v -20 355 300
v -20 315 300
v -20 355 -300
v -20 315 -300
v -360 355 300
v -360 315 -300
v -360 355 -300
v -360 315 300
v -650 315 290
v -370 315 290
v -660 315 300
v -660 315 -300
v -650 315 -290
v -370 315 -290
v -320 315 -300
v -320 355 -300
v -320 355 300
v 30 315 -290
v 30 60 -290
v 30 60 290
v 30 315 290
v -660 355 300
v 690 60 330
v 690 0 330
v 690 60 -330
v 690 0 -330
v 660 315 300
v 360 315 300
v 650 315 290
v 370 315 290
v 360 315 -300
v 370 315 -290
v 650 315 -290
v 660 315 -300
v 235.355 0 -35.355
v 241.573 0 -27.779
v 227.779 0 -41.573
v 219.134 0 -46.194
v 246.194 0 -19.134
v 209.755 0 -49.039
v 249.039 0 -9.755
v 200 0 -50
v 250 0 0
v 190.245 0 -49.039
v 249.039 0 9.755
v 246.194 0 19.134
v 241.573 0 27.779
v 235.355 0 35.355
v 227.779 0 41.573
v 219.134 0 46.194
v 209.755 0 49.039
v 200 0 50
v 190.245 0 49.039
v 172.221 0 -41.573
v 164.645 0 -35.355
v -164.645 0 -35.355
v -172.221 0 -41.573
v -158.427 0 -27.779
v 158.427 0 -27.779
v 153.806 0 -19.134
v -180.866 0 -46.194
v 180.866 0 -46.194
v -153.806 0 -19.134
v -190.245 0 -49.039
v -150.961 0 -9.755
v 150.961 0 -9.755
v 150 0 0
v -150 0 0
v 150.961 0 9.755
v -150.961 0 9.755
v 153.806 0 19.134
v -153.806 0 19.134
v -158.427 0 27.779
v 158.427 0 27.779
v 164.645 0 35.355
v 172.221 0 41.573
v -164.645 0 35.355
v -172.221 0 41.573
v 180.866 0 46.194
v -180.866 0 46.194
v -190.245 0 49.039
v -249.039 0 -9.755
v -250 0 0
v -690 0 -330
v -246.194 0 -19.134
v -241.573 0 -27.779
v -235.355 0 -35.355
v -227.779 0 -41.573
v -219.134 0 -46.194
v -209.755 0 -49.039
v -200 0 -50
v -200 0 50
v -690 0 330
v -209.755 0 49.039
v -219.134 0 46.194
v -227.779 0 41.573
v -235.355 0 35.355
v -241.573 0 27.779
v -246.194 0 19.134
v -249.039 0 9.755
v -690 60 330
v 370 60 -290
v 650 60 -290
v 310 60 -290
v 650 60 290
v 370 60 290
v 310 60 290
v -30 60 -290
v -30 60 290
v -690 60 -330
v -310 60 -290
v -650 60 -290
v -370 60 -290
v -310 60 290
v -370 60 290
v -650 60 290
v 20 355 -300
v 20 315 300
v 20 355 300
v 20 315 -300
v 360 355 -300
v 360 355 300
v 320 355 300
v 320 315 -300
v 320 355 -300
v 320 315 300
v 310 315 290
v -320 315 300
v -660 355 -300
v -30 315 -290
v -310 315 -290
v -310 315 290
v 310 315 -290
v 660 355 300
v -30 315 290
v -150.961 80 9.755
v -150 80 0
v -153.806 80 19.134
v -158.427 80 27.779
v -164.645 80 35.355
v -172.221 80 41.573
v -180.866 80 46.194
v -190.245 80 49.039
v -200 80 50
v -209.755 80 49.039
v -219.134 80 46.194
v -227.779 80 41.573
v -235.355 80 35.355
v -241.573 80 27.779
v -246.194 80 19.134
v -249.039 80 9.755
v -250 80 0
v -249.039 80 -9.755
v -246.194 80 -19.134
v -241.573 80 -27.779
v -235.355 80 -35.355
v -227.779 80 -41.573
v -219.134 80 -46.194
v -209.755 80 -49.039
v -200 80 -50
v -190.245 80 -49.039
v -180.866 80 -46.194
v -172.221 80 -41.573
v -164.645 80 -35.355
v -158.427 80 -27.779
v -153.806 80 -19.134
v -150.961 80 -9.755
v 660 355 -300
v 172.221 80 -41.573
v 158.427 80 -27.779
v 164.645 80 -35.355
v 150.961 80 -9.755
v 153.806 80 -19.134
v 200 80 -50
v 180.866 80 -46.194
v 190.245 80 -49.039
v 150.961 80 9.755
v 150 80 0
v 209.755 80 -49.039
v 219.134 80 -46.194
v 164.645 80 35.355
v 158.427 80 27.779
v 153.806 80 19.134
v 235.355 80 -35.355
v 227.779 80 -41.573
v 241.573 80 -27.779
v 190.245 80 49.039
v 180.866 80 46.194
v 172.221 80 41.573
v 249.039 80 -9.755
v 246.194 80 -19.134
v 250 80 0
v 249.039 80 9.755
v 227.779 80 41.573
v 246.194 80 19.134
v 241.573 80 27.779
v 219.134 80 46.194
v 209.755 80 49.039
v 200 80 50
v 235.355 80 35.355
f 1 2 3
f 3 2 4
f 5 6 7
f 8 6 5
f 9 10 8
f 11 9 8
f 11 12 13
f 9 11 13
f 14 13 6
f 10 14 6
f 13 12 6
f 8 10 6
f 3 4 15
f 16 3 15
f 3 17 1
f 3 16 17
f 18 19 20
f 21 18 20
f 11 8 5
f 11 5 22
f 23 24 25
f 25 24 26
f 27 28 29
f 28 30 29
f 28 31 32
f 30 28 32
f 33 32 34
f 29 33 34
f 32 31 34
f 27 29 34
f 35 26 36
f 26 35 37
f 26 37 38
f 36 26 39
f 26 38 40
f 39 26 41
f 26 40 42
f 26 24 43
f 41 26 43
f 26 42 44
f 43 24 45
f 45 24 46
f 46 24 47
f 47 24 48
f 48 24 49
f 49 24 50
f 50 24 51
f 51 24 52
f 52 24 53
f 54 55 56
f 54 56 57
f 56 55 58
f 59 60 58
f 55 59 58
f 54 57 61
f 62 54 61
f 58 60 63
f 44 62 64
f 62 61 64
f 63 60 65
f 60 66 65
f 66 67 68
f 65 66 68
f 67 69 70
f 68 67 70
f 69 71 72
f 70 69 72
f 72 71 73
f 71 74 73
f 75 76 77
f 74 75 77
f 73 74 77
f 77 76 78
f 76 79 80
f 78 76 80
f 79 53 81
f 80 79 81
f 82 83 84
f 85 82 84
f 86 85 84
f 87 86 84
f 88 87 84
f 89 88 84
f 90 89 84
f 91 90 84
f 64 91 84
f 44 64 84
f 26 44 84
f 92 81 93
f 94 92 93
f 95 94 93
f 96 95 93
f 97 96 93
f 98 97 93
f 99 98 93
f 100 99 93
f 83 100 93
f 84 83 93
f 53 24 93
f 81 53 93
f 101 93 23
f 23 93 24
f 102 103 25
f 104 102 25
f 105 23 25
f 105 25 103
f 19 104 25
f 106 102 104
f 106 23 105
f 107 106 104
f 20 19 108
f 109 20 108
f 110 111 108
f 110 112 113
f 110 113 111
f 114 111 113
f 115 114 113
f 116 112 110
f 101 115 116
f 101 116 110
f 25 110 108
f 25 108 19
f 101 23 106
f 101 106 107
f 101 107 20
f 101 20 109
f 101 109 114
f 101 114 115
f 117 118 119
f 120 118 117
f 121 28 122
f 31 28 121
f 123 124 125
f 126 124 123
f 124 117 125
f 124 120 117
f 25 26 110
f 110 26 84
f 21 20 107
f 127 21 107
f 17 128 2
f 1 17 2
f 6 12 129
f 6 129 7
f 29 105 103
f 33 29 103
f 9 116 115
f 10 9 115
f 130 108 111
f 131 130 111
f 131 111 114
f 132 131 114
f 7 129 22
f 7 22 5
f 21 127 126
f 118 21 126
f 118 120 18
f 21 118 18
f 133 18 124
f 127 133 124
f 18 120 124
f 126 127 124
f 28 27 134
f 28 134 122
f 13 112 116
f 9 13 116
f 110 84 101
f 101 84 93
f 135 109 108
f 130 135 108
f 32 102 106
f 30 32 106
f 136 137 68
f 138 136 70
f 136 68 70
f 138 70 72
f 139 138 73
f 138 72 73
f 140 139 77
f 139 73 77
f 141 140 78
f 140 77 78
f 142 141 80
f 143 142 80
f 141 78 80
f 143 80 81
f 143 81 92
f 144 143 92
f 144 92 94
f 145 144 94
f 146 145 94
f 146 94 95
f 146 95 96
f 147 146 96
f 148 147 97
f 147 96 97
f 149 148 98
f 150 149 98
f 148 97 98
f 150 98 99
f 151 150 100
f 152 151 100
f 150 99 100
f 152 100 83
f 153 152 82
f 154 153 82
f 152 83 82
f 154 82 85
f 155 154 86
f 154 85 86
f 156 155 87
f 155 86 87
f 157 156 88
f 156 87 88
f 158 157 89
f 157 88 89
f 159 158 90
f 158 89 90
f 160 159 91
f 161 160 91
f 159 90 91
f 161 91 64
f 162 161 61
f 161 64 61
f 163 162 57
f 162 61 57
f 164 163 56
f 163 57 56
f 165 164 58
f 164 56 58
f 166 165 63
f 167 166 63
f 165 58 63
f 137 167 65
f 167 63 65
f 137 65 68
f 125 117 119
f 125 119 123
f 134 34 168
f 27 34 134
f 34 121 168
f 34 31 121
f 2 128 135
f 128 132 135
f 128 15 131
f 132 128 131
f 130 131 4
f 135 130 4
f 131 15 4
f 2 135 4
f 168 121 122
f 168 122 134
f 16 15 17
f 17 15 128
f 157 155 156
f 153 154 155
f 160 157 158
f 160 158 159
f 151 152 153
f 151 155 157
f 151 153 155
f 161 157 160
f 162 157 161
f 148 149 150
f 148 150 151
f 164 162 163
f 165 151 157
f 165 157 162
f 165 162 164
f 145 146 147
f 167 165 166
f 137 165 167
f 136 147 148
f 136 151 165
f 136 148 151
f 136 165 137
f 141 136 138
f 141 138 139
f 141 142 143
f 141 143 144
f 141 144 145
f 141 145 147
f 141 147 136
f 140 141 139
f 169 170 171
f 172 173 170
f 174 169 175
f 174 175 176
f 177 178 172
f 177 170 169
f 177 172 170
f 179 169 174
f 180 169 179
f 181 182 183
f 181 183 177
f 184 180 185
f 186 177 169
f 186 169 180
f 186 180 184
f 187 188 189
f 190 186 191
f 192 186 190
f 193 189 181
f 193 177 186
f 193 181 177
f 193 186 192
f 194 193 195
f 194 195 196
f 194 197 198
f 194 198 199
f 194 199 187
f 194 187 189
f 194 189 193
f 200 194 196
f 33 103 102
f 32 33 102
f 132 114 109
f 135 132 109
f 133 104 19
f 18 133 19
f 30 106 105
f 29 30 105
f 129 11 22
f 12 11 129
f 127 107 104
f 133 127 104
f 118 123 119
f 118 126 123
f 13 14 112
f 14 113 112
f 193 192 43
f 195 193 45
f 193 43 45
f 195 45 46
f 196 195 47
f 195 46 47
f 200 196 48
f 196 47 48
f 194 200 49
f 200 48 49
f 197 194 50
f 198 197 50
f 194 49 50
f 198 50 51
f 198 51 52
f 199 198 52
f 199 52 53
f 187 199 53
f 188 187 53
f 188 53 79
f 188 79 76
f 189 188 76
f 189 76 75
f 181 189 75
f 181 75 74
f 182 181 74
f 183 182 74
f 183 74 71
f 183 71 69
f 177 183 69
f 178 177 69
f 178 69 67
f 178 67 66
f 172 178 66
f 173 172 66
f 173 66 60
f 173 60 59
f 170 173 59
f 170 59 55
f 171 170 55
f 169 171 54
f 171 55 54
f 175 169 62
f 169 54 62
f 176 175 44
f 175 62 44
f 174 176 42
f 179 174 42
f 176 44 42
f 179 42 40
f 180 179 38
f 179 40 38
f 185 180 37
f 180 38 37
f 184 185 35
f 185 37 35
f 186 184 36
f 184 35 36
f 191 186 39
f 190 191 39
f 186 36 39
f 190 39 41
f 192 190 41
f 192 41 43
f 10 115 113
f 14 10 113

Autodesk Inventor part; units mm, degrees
ref_plane "YZ Plane" through (0, 0, 0) normal (1, 0, 0) x (0, 1, 0)
ref_plane "XZ Plane" through (0, 0, 0) normal (0, 1, 0) x (-1, 0, 0)
ref_plane "XY Plane" through (0, 0, 0) normal (0, 0, 1) x (1, 0, 0)
sketch "Sketch1" plane through (0, 0, 0) normal (0, 1, 0) x (-1, 0, 0)
  line L0 (-690, -330) -> (690, -330)
  line L1 (690, -330) -> (690, 330)
  line L2 (690, 330) -> (-690, 330)
  line L3 (-690, 330) -> (-690, -330)
  line L4 (-690, -330) -> (690, 330) construction
  line L5 (690, -330) -> (-690, 330) construction
  point P0 (0, 0)
  dimension "d0" = 1380
  dimension "d1" = 660
extrude "Extrusion1" add sketch "Sketch1" along normal blind 60
sketch "Sketch2" plane through (0, 60, 0) normal (0, 1, 0) x (1, 0, 0)
  line L0 (-660, 300) -> (-360, 300) construction
  line L1 (-360, 300) -> (-360, -300) construction
  line L2 (-360, -300) -> (-660, -300) construction
  line L3 (-660, -300) -> (-660, 300) construction
  line L4 (-660, 300) -> (-360, -300) construction
  line L5 (-360, 300) -> (-660, -300) construction
  line L6 (-690, 330) -> (-690, -330) projected
  line L7 (-690, 0) -> (690, 0) construction
  line L8 (690, -330) -> (690, 330) construction
  line L9 (-370, 290) -> (-650, 290)
  line L10 (-650, 290) -> (-650, -290)
  line L11 (-650, -290) -> (-370, -290)
  line L12 (-370, -290) -> (-370, 290)
  line L13 (-20, 300) -> (-20, -300) construction
  line L14 (-30, -290) -> (-30, 290)
  line L15 (-30, 290) -> (-310, 290)
  line L16 (-320, 300) -> (-20, 300) construction
  line L17 (-310, 290) -> (-310, -290)
  line L18 (-320, -300) -> (-320, 300) construction
  line L19 (-320, 300) -> (-20, -300) construction
  line L20 (-20, 300) -> (-320, -300) construction
  line L21 (-310, -290) -> (-30, -290)
  line L22 (-20, -300) -> (-320, -300) construction
  line L23 (320, 300) -> (320, -300) construction
  line L24 (310, -290) -> (310, 290)
  line L25 (310, 290) -> (30, 290)
  line L26 (20, 300) -> (320, 300) construction
  line L27 (30, 290) -> (30, -290)
  line L28 (20, -300) -> (20, 300) construction
  line L29 (20, 300) -> (320, -300) construction
  line L30 (320, 300) -> (20, -300) construction
  line L31 (30, -290) -> (310, -290)
  line L32 (320, -300) -> (20, -300) construction
  line L33 (660, 300) -> (660, -300) construction
  line L34 (650, -290) -> (650, 290)
  line L35 (650, 290) -> (370, 290)
  line L36 (360, 300) -> (660, 300) construction
  line L37 (370, 290) -> (370, -290)
  line L38 (360, -300) -> (360, 300) construction
  line L39 (360, 300) -> (660, -300) construction
  line L40 (660, 300) -> (360, -300) construction
  line L41 (370, -290) -> (650, -290)
  line L42 (660, -300) -> (360, -300) construction
  point P0 (0, 0)
  point P1 (-510, 0)
  point P2 (-170, 0)
  point P3 (170, 0)
  point P4 (510, 0)
  dimension "d4" = 300
  dimension "d5" = 600
  dimension "d6" = 30
  dimension "d7" = 10
  dimension "d10" = 340
extrude "Extrusion2" add sketch "Sketch2" along normal blind 255
sketch "Sketch3" plane through (0, 315, 0) normal (0, 1, 0) x (1, 0, 0)
  line L0 (-650, 290) -> (-650, -290) construction
  line L1 (-650, -290) -> (-370, -290) construction
  line L2 (-370, -290) -> (-370, 290) construction
  line L3 (-370, 290) -> (-650, 290) construction
  line L4 (-30, 290) -> (-310, 290) construction
  line L5 (-310, 290) -> (-310, -290) construction
  line L6 (-310, -290) -> (-30, -290) construction
  line L7 (-30, -290) -> (-30, 290) construction
  line L8 (310, 290) -> (30, 290) construction
  line L9 (30, 290) -> (30, -290) construction
  line L10 (30, -290) -> (310, -290) construction
  line L11 (310, -290) -> (310, 290) construction
  line L12 (650, 290) -> (370, 290) construction
  line L13 (370, 290) -> (370, -290) construction
  line L14 (370, -290) -> (650, -290) construction
  line L15 (650, -290) -> (650, 290) construction
  line L16 (-360, 300) -> (-360, -300)
  line L17 (-360, -300) -> (-660, -300)
  line L18 (-660, -300) -> (-660, 300)
  line L19 (-660, 300) -> (-360, 300)
  line L20 (-20, 300) -> (-320, 300)
  line L21 (-320, 300) -> (-320, -300)
  line L22 (-320, -300) -> (-20, -300)
  line L23 (-20, -300) -> (-20, 300)
  line L24 (20, 300) -> (320, 300)
  line L25 (320, 300) -> (320, -300)
  line L26 (320, -300) -> (20, -300)
  line L27 (20, -300) -> (20, 300)
  line L28 (360, -300) -> (360, 300)
  line L29 (360, 300) -> (660, 300)
  line L30 (660, 300) -> (660, -300)
  line L31 (660, -300) -> (360, -300)
  point P0 (0, 0)
  dimension "d17" = 10
  dimension "d18" = 10
  dimension "d19" = 10
  dimension "d20" = 10
extrude "Extrusion3" add sketch "Sketch3" along normal blind 40
sketch "Sketch4" plane through (0, 0, 0) normal (0, -1, 0) x (1, 0, 0)
  circle A0 centre (-200, 0) radius 50
  circle A1 centre (200, 0) radius 50
  line L0 (-200, 0) -> (200, 0) construction
  point P0 (0, 0)
  point P1 (0, 0)
  dimension "d23" = 100
  dimension "d24" = 100
  dimension "d25" = 400
extrude "Extrusion4" cut sketch "Sketch4" against normal blind 80
properties part number "SACMI PH1500 30X60 DIE SET TILES BOTTOM MOLD"
